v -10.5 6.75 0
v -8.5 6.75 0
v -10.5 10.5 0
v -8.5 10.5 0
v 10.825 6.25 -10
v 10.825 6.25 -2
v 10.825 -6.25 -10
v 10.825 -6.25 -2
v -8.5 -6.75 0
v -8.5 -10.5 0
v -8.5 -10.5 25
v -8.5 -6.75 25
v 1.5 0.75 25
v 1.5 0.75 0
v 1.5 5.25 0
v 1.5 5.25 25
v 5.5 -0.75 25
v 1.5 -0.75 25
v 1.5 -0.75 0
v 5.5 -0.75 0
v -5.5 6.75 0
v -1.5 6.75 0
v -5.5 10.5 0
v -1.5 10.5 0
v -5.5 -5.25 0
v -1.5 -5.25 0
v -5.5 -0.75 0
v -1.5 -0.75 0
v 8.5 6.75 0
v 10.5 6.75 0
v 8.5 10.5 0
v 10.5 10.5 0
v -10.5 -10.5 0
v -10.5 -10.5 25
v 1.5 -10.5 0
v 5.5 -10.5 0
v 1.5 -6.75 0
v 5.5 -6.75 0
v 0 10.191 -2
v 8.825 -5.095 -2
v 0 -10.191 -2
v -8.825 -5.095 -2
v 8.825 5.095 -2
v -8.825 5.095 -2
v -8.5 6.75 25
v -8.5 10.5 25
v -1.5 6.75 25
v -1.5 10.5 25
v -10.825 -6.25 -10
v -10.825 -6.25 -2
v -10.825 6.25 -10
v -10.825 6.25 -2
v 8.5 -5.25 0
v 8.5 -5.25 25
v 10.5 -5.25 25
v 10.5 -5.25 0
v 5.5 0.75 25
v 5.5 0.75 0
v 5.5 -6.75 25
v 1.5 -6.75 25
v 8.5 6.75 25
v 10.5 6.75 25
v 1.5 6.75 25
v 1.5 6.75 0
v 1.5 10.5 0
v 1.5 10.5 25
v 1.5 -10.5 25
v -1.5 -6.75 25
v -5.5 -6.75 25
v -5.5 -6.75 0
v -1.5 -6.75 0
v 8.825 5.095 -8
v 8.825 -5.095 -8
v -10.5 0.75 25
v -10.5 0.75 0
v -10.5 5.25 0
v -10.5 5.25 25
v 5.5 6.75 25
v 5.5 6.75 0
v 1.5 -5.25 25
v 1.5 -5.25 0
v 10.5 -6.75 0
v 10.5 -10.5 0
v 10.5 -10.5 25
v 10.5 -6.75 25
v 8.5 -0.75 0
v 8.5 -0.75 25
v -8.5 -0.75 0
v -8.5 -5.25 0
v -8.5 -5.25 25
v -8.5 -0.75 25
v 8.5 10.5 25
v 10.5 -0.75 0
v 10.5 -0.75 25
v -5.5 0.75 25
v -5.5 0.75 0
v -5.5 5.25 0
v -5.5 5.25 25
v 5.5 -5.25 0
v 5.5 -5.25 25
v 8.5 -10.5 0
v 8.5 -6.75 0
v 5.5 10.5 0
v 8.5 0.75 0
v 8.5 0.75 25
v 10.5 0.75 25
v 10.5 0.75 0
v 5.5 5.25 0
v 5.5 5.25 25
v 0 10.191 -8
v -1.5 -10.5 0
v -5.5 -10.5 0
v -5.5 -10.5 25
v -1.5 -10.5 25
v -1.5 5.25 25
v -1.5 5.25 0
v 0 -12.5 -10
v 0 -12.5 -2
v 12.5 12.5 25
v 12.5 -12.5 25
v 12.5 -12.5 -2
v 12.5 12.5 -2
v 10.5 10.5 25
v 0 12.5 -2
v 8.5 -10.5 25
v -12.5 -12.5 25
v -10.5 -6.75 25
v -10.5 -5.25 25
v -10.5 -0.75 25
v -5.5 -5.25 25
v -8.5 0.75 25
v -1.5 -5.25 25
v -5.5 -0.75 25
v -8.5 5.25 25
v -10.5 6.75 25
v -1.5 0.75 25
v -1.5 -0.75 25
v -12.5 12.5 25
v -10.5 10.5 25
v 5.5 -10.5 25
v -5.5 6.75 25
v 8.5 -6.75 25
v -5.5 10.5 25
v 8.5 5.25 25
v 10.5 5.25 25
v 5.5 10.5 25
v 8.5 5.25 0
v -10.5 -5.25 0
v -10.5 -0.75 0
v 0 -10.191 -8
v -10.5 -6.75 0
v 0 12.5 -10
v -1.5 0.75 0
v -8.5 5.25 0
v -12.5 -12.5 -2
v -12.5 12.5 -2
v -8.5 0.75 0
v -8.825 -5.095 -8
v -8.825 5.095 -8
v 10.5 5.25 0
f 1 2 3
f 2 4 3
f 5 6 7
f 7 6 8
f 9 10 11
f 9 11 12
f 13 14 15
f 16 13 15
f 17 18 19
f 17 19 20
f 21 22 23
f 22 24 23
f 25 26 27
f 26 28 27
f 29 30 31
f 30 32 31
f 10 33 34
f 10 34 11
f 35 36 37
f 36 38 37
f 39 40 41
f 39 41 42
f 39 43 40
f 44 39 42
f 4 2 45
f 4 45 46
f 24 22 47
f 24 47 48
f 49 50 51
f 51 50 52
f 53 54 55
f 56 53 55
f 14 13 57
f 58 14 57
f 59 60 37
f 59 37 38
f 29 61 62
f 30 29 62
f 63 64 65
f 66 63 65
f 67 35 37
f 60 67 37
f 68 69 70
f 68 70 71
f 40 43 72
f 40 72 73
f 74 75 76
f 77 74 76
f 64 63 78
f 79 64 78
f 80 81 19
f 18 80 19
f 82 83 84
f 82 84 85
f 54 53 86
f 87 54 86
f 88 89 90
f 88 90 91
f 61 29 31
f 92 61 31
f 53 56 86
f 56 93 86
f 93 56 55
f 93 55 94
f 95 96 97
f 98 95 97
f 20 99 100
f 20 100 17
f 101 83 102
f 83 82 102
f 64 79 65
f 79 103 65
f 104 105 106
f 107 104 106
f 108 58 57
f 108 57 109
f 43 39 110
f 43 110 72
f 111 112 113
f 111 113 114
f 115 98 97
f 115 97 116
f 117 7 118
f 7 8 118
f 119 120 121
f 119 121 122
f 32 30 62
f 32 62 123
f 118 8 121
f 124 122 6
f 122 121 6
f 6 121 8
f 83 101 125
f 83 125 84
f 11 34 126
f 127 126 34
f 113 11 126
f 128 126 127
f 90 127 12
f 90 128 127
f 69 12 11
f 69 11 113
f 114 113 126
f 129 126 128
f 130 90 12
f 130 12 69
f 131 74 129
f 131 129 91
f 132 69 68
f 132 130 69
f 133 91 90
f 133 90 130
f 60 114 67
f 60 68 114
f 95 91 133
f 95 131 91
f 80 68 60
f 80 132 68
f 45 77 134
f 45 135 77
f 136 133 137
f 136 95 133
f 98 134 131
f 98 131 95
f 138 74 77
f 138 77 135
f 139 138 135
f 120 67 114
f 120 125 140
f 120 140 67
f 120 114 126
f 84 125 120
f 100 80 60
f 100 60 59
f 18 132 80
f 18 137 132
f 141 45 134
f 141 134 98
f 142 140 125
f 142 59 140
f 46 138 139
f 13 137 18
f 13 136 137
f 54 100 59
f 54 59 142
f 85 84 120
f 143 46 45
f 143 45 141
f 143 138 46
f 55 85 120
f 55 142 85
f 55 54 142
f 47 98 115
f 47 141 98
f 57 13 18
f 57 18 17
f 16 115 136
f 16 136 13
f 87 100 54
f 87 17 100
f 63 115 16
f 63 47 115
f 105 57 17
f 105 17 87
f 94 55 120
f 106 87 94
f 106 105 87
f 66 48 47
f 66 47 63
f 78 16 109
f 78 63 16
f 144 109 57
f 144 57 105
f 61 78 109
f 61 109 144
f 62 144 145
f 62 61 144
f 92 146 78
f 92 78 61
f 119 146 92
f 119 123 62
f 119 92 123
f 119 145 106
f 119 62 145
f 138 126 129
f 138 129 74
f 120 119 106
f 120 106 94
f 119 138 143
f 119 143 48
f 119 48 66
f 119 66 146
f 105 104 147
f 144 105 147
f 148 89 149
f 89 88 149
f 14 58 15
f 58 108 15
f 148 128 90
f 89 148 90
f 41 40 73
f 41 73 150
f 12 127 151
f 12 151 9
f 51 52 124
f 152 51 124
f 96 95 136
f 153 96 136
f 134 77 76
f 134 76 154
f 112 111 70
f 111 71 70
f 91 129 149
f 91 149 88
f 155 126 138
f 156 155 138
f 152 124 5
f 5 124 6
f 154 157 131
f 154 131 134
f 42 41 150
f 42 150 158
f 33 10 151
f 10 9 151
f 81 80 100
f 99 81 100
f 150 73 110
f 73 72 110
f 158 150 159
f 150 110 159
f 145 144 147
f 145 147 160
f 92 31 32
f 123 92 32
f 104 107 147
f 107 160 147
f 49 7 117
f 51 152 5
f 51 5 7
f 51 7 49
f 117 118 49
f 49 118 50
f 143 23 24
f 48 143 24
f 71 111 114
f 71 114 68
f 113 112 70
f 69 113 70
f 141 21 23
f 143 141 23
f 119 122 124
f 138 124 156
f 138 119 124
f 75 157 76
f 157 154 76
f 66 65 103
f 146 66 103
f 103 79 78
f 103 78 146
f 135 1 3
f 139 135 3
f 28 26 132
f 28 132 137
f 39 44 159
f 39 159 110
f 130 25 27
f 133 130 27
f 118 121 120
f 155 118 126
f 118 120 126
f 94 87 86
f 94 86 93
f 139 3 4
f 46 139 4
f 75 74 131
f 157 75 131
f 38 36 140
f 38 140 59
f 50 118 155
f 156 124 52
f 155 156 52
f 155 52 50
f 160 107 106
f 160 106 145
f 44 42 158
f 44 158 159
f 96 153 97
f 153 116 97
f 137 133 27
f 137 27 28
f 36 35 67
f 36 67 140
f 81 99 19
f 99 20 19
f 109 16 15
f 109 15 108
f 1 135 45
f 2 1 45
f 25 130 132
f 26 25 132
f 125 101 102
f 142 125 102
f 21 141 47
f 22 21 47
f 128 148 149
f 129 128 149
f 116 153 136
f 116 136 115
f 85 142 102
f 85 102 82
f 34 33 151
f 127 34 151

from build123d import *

# Parameters (mm, degrees)
SKETCH_8_W       = 25
SKETCH_8_H       = 25
SKETCH_8_W_2     = 4
SKETCH_8_H_2     = 21
SKETCH_8_W_3     = 2
EXTRUDE_7_DEPTH  = 25
SKETCH_9_W       = 25
SKETCH_9_H       = 25
EXTRUDE_8_DEPTH  = 2
SKETCH_14_W      = 25
SKETCH_14_H      = 1.5
EXTRUDE_11_DEPTH = 25
EXTRUDE_14_DEPTH = 6
EXTRUDE_16_DEPTH = 2


with BuildPart() as part:
    # 草图8 → 凸台-拉伸7 (new body)
    with BuildSketch(Plane.XY):
        Rectangle(SKETCH_8_W, SKETCH_8_H)
        with Locations((3.5, 0)):
            Rectangle(SKETCH_8_W_2, SKETCH_8_H_2, mode=Mode.SUBTRACT)
        with Locations((-3.5, 0)):
            Rectangle(SKETCH_8_W_2, SKETCH_8_H_2, mode=Mode.SUBTRACT)
        with Locations((-9.5, 0)):
            Rectangle(SKETCH_8_W_3, SKETCH_8_H_2, mode=Mode.SUBTRACT)
        with Locations((9.5, 0)):
            Rectangle(SKETCH_8_W_3, SKETCH_8_H_2, mode=Mode.SUBTRACT)
    extrude(amount=EXTRUDE_7_DEPTH)

    # 草图9 → 凸台-拉伸8 (add)
    with BuildSketch(Plane(origin=(0, 0, 0), x_dir=(-1, 0, 0), z_dir=(0, 0, -1))):
        Rectangle(SKETCH_9_W, SKETCH_9_H)
    extrude(amount=EXTRUDE_8_DEPTH)

    # 草图14 → 凸台-拉伸11 (add)
    with BuildSketch(Plane.XY.offset(25)):
        Rectangle(SKETCH_14_W, SKETCH_14_H)
        with Locations((0, 6)):
            Rectangle(SKETCH_14_W, SKETCH_14_H)
        with Locations((0, -6)):
            Rectangle(SKETCH_14_W, SKETCH_14_H)
    extrude(amount=-EXTRUDE_11_DEPTH)

    # 草图16 → 凸台-拉伸14 (add)
    with BuildSketch(Plane(origin=(0, 0, -2), x_dir=(-1, 0, 0), z_dir=(0, 0, -1))):
        Polygon((0, -12.5), (10.825317547, -6.25), (10.825317547, 6.25), (0, 12.5), (-10.825317547, 6.25), (-10.825317547, -6.25), align=None)
        Polygon((0, -10.190598923), (8.825317547, -5.095299462), (8.825317547, 5.095299462), (0, 10.190598923), (-8.825317547, 5.095299462), (-8.825317547, -5.095299462), align=None, mode=Mode.SUBTRACT)
    extrude(amount=EXTRUDE_14_DEPTH)

    # 草图18 → 凸台-拉伸16 (add)
    with BuildSketch(Plane(origin=(0, 0, -8), x_dir=(-1, 0, 0), z_dir=(0, 0, -1))):
        Polygon((0, 12.5), (-10.825317547, 6.25), (-10.825317547, -6.25), (0, -12.5), (10.825317547, -6.25), (10.825317547, 6.25), align=None)
    extrude(amount=EXTRUDE_16_DEPTH)


solid = part.part
